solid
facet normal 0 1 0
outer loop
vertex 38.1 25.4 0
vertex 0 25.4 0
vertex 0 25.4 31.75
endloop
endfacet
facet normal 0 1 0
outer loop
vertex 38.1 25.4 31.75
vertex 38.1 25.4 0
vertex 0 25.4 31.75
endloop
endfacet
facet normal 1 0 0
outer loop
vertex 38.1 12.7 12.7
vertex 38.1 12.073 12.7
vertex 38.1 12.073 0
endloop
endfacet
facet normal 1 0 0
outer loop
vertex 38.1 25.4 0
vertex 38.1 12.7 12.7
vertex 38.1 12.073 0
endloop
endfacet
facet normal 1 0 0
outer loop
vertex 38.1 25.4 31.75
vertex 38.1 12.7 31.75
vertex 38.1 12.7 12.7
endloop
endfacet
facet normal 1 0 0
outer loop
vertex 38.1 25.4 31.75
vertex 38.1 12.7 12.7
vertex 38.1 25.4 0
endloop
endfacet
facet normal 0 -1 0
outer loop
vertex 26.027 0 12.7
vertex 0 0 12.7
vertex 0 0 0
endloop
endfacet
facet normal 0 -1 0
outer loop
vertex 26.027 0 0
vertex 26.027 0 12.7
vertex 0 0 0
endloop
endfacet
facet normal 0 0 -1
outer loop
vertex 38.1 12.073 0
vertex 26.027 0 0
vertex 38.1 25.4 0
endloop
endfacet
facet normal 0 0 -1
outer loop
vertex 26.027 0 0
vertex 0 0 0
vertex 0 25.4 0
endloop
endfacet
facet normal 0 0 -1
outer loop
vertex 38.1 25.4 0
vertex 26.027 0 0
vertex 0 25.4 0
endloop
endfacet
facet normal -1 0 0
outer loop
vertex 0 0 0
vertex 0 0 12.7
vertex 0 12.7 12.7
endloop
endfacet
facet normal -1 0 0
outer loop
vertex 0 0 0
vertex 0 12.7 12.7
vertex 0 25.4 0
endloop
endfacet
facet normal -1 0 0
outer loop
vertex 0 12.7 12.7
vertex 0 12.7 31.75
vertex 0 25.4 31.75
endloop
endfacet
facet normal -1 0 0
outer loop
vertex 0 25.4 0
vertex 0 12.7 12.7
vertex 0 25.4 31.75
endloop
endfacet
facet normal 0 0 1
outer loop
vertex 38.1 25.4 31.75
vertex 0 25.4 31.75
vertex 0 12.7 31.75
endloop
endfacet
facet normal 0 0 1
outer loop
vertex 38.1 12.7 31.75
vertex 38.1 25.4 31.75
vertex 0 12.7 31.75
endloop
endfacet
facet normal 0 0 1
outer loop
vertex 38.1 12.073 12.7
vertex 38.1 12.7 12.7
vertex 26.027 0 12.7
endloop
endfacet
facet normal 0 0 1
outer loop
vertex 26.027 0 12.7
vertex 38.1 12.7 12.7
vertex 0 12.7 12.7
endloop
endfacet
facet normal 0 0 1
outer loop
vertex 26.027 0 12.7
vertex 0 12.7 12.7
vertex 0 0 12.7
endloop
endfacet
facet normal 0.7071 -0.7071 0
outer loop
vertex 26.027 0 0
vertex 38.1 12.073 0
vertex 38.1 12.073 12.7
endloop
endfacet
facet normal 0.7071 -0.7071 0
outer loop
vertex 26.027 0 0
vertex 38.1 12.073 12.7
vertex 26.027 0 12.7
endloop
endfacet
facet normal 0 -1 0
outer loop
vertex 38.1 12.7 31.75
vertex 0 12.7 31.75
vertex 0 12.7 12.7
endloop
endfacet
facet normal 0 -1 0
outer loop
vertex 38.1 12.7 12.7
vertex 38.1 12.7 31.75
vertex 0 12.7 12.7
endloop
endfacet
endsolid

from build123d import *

# Parameters (mm, degrees)
F1_DEPTH = 38.1
F3_DEPTH = 25.4


with BuildPart() as f1:
    # F0 (on Right) → F1 (new body)
    with BuildSketch(Plane.YZ):
        Polygon((0, 12.7), (0, 0), (25.4, 0), (25.4, 31.75), (12.7, 31.75), (12.7, 12.7), align=None)
    extrude(amount=F1_DEPTH)

    # F2 (on Top) → F3 (cut)
    with BuildSketch(Plane.XY):
        Polygon((26.027159, 0), (38.727159, 0), (38.727159, 12.7), align=None)
    extrude(amount=F3_DEPTH, mode=Mode.SUBTRACT)


solid = f1.part
